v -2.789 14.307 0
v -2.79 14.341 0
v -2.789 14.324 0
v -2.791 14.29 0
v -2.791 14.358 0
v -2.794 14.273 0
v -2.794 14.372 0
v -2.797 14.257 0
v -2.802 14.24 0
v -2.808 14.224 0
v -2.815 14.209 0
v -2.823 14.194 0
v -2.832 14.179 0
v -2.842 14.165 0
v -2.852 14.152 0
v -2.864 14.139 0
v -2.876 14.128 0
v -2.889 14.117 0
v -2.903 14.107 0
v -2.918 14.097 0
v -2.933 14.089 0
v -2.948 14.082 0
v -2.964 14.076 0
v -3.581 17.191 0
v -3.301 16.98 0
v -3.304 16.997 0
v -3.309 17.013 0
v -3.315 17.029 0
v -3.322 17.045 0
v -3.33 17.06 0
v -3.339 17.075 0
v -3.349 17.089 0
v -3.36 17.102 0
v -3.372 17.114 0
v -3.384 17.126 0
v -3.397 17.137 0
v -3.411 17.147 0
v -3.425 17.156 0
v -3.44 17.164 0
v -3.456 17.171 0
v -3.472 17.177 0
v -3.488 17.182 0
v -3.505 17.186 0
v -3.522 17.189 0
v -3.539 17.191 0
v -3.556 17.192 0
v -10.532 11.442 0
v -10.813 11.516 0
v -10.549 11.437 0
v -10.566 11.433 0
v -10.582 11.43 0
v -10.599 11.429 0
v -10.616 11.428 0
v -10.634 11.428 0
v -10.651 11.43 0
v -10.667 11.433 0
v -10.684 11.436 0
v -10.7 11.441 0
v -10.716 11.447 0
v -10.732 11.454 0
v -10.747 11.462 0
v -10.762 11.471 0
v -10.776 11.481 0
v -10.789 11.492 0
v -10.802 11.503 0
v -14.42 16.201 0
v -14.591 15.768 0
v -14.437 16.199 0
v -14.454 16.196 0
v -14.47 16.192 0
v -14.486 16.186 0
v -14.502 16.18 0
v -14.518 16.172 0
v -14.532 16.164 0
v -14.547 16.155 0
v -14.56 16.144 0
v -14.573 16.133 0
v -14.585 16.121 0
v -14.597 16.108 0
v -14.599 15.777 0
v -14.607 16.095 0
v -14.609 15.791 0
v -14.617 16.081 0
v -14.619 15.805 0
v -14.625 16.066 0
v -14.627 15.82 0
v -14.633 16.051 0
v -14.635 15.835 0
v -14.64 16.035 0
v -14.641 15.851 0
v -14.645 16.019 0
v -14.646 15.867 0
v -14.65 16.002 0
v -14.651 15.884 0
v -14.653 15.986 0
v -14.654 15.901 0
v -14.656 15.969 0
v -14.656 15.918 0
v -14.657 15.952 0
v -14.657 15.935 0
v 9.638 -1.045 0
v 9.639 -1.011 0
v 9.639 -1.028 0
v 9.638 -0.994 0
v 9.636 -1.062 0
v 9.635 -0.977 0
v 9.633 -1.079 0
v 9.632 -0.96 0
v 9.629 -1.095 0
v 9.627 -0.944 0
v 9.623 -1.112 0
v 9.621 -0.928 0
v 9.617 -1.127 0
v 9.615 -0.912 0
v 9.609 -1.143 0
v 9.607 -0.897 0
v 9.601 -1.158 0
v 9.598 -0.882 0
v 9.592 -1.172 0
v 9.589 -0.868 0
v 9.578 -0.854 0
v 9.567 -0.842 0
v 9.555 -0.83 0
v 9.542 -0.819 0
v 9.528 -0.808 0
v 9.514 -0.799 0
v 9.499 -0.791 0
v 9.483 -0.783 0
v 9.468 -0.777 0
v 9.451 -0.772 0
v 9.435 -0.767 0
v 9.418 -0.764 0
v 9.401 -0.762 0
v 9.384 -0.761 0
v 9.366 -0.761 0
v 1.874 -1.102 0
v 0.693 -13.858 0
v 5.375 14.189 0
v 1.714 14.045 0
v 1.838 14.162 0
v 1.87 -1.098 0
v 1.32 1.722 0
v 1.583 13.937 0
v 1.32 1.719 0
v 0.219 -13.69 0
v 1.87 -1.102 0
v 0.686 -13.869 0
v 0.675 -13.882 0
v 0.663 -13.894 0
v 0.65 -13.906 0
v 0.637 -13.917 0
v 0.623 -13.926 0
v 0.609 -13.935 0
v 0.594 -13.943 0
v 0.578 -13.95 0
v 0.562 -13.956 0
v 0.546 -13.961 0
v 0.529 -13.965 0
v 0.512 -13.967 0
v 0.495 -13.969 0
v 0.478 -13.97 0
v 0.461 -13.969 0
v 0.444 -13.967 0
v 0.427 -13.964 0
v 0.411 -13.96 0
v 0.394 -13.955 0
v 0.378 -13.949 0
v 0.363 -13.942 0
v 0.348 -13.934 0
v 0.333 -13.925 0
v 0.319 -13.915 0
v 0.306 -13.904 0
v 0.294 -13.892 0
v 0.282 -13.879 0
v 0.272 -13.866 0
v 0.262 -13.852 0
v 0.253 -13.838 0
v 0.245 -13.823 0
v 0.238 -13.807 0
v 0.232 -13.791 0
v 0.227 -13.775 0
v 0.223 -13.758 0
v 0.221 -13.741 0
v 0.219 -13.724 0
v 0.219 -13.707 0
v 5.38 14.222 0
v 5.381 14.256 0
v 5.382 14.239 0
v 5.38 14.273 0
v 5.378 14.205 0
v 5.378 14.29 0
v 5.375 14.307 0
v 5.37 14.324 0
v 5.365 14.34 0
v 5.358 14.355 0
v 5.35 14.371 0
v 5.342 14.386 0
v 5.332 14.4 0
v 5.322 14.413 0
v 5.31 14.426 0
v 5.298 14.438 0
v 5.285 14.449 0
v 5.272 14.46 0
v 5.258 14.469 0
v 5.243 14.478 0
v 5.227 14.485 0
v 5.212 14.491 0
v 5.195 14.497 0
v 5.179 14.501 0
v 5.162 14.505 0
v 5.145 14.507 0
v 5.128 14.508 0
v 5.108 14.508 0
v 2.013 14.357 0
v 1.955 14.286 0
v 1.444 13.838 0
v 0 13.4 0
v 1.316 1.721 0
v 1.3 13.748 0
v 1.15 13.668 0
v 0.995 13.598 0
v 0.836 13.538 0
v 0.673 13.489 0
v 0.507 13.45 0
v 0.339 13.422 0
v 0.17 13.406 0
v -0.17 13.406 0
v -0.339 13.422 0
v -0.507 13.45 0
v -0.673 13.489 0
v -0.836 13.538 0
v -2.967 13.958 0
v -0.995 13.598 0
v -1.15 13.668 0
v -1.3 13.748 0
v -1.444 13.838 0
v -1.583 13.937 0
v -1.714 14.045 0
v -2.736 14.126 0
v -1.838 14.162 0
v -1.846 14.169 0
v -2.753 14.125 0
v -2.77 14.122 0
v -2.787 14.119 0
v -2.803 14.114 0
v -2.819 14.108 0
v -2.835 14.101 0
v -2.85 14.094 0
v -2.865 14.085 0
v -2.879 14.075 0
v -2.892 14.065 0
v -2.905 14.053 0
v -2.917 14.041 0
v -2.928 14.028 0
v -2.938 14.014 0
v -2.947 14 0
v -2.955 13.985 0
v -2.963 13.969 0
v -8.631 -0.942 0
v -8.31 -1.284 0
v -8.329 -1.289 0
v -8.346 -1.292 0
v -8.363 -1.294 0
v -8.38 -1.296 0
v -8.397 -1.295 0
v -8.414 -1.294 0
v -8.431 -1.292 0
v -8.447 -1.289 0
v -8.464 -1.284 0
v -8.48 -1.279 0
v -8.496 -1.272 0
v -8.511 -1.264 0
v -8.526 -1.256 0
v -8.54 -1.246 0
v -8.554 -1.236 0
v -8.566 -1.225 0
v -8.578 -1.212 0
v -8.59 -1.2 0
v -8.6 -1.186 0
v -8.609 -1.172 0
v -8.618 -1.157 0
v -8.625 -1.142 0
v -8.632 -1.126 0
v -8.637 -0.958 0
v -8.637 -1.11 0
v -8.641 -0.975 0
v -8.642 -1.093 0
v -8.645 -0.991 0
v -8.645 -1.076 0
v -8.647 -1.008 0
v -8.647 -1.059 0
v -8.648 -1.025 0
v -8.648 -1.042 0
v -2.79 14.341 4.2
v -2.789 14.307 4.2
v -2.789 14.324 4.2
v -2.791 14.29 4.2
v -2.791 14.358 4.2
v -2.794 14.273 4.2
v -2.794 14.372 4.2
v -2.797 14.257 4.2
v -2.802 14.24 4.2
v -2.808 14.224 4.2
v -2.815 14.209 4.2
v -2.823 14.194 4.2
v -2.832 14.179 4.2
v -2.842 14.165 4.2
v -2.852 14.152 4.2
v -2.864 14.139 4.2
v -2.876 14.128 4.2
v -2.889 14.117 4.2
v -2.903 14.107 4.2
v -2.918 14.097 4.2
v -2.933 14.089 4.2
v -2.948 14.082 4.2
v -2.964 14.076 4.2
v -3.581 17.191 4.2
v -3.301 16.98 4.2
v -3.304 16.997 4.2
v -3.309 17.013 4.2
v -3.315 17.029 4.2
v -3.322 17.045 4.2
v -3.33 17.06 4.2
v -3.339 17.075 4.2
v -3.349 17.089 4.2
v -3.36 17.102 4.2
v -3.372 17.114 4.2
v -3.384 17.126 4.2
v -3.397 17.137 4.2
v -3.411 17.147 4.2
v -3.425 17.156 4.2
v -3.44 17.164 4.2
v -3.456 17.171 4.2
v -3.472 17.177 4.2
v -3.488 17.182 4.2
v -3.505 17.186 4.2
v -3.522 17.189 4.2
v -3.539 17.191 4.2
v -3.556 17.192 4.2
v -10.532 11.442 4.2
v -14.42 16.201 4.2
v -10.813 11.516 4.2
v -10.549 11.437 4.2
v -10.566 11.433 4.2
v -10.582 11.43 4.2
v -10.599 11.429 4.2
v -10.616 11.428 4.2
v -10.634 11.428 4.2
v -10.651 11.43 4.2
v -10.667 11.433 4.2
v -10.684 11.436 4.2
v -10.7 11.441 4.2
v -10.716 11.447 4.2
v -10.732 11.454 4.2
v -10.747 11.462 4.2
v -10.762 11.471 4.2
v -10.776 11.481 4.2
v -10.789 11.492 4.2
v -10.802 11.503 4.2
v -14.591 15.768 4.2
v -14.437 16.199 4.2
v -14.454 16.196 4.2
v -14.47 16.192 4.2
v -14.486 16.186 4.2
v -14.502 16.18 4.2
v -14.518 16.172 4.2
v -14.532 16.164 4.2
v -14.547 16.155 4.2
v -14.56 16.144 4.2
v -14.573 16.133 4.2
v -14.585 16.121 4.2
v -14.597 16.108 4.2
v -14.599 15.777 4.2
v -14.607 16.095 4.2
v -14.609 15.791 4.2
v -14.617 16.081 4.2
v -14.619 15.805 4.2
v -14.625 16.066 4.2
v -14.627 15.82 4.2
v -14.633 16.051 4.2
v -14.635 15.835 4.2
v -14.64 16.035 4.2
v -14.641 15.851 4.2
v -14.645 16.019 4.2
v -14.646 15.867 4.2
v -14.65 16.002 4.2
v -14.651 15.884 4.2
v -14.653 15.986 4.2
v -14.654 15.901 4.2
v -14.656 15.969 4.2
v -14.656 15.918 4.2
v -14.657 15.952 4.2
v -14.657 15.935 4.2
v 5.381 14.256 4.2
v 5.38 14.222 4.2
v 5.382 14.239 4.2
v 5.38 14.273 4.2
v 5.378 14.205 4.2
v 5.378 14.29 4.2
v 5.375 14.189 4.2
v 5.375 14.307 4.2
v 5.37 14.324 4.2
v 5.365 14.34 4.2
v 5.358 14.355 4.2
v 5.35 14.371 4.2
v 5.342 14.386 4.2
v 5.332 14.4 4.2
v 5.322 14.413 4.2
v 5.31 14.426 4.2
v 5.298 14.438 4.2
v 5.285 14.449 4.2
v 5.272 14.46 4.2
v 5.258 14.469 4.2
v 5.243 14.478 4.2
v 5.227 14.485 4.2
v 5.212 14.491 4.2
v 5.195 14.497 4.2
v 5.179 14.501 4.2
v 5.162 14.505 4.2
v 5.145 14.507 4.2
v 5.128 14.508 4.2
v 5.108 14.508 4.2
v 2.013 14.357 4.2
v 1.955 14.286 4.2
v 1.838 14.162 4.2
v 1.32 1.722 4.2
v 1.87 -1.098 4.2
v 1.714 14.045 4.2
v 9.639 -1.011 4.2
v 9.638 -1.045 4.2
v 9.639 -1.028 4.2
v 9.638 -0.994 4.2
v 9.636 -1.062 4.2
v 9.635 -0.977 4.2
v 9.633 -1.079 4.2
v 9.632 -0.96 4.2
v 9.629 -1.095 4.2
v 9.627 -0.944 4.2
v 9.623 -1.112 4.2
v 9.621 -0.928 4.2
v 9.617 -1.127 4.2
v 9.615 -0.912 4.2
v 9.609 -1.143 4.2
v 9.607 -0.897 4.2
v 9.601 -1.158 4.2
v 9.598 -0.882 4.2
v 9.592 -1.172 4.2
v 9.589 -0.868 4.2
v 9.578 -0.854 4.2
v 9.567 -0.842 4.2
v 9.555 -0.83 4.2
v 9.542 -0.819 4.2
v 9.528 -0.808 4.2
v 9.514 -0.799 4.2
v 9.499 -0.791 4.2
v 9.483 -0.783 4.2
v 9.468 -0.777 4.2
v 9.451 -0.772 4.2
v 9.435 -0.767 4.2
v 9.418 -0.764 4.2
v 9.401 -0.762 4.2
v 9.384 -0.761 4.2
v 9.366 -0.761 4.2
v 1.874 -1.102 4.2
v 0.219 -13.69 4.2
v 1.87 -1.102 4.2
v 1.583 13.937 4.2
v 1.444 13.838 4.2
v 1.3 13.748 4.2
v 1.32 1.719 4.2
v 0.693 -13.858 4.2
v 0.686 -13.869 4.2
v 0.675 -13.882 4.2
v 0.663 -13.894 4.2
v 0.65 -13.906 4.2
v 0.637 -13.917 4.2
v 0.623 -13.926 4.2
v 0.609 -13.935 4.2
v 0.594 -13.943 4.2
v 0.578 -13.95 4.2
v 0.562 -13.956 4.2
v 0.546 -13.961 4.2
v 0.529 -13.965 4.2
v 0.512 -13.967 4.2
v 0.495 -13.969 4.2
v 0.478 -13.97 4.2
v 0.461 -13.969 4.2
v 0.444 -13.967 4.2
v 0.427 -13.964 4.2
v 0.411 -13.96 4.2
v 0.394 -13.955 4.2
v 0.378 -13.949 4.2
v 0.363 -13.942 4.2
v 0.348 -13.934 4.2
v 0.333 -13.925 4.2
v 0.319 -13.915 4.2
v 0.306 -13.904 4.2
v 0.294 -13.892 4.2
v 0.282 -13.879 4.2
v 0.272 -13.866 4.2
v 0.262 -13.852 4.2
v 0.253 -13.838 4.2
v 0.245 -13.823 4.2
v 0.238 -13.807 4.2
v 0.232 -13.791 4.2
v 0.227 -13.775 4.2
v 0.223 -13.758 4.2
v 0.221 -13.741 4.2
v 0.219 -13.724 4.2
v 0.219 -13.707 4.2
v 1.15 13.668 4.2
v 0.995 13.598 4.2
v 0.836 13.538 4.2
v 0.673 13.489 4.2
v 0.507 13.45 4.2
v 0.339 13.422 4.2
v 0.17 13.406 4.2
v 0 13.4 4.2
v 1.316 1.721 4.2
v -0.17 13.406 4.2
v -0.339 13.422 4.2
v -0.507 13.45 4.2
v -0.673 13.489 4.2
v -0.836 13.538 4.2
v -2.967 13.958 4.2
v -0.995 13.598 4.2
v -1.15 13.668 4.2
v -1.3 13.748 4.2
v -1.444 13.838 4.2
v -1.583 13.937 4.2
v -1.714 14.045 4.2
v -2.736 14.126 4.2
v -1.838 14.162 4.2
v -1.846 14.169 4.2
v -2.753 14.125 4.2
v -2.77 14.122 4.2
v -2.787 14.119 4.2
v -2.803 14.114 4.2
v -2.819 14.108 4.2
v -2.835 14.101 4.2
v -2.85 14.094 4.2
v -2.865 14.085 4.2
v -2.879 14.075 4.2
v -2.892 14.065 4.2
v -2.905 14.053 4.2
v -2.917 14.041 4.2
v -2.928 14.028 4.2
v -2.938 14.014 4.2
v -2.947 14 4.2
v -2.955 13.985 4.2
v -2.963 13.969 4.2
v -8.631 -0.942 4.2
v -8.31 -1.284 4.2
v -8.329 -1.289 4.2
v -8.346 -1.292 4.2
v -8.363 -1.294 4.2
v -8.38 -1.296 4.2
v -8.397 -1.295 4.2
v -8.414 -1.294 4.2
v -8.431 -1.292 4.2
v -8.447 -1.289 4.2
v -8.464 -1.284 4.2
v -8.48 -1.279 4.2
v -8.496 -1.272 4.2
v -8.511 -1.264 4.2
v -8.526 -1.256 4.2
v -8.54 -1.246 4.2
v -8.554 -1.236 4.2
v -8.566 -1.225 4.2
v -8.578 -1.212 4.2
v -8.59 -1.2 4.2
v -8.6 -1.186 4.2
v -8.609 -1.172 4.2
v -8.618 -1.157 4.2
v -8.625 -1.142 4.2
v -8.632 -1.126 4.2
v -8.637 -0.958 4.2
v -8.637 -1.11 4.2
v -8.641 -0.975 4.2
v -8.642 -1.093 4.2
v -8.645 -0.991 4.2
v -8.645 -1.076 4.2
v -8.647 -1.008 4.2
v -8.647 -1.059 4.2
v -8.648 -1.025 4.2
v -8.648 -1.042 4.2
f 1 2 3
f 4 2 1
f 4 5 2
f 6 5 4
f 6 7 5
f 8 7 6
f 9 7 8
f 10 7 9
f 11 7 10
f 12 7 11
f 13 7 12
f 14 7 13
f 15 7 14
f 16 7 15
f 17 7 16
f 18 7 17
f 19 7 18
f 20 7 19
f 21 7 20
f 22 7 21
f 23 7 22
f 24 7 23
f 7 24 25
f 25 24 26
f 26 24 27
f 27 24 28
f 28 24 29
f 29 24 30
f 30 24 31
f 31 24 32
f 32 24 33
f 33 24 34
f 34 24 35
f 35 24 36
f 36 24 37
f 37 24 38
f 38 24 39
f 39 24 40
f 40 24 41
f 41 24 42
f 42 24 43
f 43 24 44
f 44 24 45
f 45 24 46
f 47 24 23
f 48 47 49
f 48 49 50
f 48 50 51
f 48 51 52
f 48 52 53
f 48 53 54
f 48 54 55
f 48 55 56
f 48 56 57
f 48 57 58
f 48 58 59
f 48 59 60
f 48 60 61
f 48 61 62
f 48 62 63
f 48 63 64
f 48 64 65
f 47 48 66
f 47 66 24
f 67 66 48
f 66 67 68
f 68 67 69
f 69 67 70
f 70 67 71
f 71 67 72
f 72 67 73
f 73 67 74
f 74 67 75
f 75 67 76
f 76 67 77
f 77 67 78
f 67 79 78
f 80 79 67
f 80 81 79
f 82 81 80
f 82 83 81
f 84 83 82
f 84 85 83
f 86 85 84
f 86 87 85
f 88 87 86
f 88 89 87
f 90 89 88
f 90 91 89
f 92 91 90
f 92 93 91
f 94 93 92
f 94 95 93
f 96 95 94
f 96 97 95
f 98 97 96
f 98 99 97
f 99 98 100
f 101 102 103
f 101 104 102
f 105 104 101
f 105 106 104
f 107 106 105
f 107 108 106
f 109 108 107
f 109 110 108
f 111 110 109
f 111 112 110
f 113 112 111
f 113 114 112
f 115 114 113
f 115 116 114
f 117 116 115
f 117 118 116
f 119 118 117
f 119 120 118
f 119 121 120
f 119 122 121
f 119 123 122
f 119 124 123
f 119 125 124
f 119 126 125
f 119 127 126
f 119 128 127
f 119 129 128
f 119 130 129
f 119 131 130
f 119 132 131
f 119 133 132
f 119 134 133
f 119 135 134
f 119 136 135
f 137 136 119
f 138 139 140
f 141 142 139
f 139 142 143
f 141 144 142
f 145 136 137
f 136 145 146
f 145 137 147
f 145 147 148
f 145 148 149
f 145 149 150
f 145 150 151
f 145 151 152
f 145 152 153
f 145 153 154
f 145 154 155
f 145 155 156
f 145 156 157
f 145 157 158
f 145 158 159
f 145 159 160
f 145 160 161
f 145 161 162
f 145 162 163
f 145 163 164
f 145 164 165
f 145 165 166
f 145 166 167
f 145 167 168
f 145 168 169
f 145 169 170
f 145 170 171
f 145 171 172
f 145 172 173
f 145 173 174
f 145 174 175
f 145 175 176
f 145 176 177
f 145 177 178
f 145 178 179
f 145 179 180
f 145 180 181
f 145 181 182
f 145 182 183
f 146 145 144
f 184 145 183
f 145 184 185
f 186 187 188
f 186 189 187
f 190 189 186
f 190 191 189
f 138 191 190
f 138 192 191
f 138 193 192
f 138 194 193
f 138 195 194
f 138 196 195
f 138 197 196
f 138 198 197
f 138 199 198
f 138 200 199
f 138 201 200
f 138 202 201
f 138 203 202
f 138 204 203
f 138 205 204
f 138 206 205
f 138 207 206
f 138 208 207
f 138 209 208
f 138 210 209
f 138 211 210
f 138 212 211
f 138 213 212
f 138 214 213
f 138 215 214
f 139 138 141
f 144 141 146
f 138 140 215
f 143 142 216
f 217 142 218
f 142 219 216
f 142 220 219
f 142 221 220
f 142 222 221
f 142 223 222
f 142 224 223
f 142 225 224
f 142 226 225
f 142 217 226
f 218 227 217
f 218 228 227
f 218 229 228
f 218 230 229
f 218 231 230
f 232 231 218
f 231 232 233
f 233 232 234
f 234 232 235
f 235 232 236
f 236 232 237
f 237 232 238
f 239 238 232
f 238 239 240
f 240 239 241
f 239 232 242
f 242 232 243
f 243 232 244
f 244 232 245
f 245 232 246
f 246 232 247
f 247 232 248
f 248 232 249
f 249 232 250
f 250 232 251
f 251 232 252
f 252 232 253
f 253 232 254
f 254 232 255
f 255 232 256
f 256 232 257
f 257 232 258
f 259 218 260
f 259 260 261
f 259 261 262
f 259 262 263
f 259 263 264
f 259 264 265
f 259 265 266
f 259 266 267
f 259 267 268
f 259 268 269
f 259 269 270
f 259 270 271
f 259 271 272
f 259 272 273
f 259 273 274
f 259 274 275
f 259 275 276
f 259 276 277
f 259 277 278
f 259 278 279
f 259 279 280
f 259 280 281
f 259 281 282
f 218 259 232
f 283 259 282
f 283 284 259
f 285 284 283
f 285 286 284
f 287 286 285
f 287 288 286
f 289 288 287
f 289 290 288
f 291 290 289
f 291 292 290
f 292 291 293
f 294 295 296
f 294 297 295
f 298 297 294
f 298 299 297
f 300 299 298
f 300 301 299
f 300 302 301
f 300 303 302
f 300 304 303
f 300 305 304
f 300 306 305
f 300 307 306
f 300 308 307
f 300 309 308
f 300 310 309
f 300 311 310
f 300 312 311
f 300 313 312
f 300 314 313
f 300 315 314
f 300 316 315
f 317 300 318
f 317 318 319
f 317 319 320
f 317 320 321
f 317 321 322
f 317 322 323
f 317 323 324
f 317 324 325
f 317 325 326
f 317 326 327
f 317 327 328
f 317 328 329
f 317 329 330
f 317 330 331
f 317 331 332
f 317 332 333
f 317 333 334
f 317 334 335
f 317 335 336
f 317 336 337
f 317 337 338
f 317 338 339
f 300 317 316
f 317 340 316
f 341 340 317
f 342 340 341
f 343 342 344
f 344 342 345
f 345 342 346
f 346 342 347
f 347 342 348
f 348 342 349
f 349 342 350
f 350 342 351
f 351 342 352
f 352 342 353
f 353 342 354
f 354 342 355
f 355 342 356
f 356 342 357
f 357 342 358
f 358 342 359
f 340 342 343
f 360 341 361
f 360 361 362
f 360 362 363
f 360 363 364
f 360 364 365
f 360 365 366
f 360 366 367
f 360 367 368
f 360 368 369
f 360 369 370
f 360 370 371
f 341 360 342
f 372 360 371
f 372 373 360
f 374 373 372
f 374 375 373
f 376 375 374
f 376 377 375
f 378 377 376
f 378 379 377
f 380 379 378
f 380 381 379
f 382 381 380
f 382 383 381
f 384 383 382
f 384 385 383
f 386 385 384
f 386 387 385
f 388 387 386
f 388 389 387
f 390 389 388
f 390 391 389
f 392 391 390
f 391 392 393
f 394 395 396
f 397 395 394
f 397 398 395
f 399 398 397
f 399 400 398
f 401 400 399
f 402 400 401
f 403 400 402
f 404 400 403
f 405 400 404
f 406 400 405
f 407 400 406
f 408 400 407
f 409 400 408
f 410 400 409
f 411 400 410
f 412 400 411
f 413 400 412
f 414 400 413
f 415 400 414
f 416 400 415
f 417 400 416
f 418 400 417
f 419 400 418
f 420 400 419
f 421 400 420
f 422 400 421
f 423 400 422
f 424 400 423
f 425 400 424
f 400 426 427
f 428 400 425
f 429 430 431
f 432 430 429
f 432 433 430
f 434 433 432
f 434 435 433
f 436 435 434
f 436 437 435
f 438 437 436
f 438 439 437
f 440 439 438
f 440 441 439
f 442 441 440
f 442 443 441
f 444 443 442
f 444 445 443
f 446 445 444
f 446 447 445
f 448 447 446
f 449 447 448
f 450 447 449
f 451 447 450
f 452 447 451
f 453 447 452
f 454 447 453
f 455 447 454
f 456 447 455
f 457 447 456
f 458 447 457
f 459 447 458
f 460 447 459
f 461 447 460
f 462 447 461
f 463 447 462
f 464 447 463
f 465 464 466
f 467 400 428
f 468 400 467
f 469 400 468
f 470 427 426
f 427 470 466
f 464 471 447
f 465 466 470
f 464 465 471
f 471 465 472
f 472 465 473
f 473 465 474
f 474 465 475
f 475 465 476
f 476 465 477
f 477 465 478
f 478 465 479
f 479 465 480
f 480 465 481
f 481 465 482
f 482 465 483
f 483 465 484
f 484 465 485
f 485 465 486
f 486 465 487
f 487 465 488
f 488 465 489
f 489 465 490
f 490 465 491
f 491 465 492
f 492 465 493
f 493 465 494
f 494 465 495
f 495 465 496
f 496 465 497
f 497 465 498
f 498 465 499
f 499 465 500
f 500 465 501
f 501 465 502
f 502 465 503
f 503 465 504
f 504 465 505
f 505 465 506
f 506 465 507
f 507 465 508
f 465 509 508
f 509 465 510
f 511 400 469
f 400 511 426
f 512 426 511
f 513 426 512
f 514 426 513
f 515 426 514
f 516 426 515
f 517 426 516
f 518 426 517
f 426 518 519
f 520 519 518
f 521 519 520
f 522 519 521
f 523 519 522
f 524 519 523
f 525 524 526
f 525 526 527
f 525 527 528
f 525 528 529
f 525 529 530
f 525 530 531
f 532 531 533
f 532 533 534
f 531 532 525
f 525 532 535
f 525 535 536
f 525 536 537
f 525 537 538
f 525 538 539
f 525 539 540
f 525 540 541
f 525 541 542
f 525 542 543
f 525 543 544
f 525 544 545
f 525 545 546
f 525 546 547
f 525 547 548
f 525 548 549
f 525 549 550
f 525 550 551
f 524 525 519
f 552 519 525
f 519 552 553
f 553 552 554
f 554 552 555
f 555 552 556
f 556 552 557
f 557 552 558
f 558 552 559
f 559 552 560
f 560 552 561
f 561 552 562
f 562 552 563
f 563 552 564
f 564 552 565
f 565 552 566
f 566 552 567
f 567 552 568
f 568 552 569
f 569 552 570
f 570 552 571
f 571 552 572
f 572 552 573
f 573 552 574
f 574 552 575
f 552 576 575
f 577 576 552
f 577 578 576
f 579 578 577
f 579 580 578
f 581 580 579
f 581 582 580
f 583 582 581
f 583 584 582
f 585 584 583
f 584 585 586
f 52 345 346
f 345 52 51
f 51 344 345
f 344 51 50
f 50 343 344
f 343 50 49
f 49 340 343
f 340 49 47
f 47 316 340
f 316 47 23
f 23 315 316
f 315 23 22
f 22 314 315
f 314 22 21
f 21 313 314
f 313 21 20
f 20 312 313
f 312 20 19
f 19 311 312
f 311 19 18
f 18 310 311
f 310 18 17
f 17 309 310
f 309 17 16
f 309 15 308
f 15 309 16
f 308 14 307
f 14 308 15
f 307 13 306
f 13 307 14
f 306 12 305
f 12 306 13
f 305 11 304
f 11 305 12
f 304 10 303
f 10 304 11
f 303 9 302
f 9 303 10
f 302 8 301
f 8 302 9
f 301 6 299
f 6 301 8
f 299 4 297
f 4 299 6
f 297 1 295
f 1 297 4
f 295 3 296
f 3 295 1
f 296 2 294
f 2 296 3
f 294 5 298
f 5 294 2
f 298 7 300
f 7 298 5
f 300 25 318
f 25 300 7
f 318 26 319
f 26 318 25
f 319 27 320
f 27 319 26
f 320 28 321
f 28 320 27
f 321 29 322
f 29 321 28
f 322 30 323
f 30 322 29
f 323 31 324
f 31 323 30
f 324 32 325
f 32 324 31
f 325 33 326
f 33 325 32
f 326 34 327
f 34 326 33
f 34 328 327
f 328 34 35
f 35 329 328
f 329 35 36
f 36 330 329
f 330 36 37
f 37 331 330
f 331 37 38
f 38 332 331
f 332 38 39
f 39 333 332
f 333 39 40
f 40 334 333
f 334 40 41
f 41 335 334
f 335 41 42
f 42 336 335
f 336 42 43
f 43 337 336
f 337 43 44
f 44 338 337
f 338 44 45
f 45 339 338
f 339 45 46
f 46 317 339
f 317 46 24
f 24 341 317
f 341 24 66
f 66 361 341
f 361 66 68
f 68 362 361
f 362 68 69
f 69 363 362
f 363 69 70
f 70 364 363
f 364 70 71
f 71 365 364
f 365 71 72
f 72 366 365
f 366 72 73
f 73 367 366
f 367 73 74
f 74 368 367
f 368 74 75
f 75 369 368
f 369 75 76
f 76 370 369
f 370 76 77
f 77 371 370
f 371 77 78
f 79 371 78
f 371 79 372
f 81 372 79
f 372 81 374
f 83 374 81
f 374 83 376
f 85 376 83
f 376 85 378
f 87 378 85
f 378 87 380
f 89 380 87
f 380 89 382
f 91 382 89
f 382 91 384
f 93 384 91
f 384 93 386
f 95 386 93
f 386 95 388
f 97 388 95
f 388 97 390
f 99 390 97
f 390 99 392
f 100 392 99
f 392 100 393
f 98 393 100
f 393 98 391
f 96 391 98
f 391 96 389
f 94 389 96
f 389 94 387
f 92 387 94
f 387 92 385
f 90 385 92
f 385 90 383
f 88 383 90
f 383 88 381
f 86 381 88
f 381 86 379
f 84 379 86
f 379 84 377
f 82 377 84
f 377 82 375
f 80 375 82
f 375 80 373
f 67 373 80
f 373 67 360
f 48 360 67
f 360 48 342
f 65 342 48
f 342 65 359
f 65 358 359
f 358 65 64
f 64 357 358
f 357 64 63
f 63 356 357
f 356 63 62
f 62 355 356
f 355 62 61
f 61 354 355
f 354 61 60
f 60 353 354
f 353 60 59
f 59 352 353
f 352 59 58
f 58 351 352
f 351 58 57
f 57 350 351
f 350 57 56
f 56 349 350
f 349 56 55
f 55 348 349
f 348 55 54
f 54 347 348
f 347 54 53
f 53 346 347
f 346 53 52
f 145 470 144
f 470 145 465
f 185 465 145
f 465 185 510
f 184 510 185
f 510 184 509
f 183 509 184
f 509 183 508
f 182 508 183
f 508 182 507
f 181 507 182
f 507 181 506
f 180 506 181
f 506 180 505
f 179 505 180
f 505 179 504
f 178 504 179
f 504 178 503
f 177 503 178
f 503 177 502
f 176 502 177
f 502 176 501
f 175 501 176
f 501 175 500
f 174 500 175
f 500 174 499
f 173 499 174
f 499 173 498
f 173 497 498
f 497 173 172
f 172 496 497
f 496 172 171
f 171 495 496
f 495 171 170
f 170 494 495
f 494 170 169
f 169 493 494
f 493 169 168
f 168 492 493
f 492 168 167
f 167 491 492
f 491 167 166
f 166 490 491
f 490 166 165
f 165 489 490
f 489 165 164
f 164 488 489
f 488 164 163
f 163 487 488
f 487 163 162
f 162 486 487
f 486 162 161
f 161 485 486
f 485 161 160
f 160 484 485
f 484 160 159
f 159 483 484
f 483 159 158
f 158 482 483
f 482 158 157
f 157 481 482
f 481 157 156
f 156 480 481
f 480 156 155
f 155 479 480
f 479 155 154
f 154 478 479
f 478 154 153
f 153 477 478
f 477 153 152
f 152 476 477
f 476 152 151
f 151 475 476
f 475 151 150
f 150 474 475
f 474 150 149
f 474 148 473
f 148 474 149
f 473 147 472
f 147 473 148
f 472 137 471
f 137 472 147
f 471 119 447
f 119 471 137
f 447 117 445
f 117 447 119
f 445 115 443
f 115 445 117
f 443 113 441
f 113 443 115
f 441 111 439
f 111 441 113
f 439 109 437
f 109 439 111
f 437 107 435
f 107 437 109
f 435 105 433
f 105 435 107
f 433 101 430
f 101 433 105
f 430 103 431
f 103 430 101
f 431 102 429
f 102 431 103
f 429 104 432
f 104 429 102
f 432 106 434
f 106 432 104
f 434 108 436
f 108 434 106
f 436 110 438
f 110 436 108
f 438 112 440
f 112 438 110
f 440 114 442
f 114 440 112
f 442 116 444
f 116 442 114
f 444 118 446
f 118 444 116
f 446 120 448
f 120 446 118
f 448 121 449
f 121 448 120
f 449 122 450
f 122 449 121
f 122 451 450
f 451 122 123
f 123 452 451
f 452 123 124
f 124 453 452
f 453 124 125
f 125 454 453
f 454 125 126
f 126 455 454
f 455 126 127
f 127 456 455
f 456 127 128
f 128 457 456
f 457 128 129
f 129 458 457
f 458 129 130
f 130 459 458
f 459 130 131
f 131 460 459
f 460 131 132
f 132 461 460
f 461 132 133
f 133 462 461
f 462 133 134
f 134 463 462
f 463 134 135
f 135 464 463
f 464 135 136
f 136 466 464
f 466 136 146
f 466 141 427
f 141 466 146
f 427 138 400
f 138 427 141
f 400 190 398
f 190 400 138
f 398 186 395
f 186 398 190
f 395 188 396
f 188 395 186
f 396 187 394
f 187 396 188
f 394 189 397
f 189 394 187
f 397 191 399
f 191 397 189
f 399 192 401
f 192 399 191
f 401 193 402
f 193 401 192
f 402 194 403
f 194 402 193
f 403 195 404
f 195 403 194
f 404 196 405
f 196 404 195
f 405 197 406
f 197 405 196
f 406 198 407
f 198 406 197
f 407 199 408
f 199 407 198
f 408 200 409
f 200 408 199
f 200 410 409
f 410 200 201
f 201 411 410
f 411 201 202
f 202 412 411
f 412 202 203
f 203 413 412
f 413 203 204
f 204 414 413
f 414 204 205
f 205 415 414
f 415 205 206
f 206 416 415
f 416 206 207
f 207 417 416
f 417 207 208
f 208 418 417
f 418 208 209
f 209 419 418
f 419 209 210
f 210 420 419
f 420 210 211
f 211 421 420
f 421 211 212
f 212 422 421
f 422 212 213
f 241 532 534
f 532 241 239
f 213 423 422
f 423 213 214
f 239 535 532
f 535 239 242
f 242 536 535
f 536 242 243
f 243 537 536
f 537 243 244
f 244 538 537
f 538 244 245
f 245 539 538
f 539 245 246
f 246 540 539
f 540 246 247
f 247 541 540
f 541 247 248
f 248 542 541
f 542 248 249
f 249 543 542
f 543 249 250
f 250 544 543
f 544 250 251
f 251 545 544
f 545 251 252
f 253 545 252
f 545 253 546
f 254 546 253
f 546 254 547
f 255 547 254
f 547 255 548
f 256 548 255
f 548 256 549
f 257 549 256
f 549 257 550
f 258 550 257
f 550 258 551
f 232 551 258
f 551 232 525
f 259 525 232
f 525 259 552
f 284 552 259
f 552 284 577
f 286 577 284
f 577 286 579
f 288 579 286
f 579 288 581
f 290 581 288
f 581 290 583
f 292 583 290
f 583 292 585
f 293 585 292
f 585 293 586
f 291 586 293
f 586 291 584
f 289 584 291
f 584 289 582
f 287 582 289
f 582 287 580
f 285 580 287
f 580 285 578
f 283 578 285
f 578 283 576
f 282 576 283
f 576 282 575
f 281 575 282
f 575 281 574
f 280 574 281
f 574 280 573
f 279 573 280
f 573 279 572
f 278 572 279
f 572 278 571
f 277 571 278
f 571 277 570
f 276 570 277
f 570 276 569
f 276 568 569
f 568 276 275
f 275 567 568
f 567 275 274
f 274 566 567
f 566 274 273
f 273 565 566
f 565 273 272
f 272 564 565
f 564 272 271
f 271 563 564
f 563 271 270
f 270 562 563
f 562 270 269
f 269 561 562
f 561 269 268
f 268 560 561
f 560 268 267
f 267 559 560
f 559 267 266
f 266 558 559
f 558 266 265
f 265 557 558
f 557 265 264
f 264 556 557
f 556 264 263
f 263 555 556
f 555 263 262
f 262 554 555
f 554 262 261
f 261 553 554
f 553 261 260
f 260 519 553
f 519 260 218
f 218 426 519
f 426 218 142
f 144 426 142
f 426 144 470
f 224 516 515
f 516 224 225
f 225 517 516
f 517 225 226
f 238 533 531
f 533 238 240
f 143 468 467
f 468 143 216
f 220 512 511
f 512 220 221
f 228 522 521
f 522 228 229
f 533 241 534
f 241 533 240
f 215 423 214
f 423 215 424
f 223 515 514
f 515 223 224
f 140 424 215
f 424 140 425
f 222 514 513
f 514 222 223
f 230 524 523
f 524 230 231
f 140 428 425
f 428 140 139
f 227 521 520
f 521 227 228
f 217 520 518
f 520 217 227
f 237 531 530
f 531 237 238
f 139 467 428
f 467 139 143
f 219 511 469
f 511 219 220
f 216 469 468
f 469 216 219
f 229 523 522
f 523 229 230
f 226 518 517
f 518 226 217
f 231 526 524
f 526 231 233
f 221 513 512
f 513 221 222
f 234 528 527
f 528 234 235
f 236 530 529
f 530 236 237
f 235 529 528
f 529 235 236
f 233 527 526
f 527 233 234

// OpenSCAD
$fn=96;
thickness_mm = 4.2;
pts = [[-10.6973, 11.3851], [-2.9162, 14.0926], [-8.8221, -1.4438], [1.3202, 1.7226], [0.1521, -14.6299], [9.8967, -0.7372], [1.8694, -1.1026], [5.452, 14.5243], [-2.7458, 14.1257], [-3.3457, 17.212], [-14.9345, 16.1543]];
hole = [0.0, 16.0, 2.6];
offset_r = 0.261;
engrave_depth = 0.9;
module shape2d(){
  // CGAL clean + controlled smooth/sharp
  offset(r=offset_r) offset(r=-offset_r)
    polygon(points=pts, paths=[[for(i=[0:len(pts)-1]) i]]);
}
module body(){
  linear_extrude(height=thickness_mm, convexity=10)
    shape2d();
}
module face_engrave(){
  // eyes
  translate([6.5, 4.8, thickness_mm-engrave_depth]) cylinder(h=engrave_depth+0.2, r=1.7034);
  translate([-6.5, 4.8, thickness_mm-engrave_depth]) cylinder(h=engrave_depth+0.2, r=1.7034);

  // mouth arc band (2D ring section extruded shallow)
  translate([0, -7.5, thickness_mm-engrave_depth])
    linear_extrude(height=engrave_depth+0.2)
      intersection(){
        // limit width
        square([13.9165, 13.9165], center=true);
        difference(){
          translate([0,5.5]) circle(r=11.6503);
          translate([0,5.5]) circle(r=10.0503);
        }
      };
}
difference(){
  body();
  // keychain hole (exactly 1)
  translate([hole[0], hole[1], -1]) cylinder(h=thickness_mm+2, r=hole[2]);
}
